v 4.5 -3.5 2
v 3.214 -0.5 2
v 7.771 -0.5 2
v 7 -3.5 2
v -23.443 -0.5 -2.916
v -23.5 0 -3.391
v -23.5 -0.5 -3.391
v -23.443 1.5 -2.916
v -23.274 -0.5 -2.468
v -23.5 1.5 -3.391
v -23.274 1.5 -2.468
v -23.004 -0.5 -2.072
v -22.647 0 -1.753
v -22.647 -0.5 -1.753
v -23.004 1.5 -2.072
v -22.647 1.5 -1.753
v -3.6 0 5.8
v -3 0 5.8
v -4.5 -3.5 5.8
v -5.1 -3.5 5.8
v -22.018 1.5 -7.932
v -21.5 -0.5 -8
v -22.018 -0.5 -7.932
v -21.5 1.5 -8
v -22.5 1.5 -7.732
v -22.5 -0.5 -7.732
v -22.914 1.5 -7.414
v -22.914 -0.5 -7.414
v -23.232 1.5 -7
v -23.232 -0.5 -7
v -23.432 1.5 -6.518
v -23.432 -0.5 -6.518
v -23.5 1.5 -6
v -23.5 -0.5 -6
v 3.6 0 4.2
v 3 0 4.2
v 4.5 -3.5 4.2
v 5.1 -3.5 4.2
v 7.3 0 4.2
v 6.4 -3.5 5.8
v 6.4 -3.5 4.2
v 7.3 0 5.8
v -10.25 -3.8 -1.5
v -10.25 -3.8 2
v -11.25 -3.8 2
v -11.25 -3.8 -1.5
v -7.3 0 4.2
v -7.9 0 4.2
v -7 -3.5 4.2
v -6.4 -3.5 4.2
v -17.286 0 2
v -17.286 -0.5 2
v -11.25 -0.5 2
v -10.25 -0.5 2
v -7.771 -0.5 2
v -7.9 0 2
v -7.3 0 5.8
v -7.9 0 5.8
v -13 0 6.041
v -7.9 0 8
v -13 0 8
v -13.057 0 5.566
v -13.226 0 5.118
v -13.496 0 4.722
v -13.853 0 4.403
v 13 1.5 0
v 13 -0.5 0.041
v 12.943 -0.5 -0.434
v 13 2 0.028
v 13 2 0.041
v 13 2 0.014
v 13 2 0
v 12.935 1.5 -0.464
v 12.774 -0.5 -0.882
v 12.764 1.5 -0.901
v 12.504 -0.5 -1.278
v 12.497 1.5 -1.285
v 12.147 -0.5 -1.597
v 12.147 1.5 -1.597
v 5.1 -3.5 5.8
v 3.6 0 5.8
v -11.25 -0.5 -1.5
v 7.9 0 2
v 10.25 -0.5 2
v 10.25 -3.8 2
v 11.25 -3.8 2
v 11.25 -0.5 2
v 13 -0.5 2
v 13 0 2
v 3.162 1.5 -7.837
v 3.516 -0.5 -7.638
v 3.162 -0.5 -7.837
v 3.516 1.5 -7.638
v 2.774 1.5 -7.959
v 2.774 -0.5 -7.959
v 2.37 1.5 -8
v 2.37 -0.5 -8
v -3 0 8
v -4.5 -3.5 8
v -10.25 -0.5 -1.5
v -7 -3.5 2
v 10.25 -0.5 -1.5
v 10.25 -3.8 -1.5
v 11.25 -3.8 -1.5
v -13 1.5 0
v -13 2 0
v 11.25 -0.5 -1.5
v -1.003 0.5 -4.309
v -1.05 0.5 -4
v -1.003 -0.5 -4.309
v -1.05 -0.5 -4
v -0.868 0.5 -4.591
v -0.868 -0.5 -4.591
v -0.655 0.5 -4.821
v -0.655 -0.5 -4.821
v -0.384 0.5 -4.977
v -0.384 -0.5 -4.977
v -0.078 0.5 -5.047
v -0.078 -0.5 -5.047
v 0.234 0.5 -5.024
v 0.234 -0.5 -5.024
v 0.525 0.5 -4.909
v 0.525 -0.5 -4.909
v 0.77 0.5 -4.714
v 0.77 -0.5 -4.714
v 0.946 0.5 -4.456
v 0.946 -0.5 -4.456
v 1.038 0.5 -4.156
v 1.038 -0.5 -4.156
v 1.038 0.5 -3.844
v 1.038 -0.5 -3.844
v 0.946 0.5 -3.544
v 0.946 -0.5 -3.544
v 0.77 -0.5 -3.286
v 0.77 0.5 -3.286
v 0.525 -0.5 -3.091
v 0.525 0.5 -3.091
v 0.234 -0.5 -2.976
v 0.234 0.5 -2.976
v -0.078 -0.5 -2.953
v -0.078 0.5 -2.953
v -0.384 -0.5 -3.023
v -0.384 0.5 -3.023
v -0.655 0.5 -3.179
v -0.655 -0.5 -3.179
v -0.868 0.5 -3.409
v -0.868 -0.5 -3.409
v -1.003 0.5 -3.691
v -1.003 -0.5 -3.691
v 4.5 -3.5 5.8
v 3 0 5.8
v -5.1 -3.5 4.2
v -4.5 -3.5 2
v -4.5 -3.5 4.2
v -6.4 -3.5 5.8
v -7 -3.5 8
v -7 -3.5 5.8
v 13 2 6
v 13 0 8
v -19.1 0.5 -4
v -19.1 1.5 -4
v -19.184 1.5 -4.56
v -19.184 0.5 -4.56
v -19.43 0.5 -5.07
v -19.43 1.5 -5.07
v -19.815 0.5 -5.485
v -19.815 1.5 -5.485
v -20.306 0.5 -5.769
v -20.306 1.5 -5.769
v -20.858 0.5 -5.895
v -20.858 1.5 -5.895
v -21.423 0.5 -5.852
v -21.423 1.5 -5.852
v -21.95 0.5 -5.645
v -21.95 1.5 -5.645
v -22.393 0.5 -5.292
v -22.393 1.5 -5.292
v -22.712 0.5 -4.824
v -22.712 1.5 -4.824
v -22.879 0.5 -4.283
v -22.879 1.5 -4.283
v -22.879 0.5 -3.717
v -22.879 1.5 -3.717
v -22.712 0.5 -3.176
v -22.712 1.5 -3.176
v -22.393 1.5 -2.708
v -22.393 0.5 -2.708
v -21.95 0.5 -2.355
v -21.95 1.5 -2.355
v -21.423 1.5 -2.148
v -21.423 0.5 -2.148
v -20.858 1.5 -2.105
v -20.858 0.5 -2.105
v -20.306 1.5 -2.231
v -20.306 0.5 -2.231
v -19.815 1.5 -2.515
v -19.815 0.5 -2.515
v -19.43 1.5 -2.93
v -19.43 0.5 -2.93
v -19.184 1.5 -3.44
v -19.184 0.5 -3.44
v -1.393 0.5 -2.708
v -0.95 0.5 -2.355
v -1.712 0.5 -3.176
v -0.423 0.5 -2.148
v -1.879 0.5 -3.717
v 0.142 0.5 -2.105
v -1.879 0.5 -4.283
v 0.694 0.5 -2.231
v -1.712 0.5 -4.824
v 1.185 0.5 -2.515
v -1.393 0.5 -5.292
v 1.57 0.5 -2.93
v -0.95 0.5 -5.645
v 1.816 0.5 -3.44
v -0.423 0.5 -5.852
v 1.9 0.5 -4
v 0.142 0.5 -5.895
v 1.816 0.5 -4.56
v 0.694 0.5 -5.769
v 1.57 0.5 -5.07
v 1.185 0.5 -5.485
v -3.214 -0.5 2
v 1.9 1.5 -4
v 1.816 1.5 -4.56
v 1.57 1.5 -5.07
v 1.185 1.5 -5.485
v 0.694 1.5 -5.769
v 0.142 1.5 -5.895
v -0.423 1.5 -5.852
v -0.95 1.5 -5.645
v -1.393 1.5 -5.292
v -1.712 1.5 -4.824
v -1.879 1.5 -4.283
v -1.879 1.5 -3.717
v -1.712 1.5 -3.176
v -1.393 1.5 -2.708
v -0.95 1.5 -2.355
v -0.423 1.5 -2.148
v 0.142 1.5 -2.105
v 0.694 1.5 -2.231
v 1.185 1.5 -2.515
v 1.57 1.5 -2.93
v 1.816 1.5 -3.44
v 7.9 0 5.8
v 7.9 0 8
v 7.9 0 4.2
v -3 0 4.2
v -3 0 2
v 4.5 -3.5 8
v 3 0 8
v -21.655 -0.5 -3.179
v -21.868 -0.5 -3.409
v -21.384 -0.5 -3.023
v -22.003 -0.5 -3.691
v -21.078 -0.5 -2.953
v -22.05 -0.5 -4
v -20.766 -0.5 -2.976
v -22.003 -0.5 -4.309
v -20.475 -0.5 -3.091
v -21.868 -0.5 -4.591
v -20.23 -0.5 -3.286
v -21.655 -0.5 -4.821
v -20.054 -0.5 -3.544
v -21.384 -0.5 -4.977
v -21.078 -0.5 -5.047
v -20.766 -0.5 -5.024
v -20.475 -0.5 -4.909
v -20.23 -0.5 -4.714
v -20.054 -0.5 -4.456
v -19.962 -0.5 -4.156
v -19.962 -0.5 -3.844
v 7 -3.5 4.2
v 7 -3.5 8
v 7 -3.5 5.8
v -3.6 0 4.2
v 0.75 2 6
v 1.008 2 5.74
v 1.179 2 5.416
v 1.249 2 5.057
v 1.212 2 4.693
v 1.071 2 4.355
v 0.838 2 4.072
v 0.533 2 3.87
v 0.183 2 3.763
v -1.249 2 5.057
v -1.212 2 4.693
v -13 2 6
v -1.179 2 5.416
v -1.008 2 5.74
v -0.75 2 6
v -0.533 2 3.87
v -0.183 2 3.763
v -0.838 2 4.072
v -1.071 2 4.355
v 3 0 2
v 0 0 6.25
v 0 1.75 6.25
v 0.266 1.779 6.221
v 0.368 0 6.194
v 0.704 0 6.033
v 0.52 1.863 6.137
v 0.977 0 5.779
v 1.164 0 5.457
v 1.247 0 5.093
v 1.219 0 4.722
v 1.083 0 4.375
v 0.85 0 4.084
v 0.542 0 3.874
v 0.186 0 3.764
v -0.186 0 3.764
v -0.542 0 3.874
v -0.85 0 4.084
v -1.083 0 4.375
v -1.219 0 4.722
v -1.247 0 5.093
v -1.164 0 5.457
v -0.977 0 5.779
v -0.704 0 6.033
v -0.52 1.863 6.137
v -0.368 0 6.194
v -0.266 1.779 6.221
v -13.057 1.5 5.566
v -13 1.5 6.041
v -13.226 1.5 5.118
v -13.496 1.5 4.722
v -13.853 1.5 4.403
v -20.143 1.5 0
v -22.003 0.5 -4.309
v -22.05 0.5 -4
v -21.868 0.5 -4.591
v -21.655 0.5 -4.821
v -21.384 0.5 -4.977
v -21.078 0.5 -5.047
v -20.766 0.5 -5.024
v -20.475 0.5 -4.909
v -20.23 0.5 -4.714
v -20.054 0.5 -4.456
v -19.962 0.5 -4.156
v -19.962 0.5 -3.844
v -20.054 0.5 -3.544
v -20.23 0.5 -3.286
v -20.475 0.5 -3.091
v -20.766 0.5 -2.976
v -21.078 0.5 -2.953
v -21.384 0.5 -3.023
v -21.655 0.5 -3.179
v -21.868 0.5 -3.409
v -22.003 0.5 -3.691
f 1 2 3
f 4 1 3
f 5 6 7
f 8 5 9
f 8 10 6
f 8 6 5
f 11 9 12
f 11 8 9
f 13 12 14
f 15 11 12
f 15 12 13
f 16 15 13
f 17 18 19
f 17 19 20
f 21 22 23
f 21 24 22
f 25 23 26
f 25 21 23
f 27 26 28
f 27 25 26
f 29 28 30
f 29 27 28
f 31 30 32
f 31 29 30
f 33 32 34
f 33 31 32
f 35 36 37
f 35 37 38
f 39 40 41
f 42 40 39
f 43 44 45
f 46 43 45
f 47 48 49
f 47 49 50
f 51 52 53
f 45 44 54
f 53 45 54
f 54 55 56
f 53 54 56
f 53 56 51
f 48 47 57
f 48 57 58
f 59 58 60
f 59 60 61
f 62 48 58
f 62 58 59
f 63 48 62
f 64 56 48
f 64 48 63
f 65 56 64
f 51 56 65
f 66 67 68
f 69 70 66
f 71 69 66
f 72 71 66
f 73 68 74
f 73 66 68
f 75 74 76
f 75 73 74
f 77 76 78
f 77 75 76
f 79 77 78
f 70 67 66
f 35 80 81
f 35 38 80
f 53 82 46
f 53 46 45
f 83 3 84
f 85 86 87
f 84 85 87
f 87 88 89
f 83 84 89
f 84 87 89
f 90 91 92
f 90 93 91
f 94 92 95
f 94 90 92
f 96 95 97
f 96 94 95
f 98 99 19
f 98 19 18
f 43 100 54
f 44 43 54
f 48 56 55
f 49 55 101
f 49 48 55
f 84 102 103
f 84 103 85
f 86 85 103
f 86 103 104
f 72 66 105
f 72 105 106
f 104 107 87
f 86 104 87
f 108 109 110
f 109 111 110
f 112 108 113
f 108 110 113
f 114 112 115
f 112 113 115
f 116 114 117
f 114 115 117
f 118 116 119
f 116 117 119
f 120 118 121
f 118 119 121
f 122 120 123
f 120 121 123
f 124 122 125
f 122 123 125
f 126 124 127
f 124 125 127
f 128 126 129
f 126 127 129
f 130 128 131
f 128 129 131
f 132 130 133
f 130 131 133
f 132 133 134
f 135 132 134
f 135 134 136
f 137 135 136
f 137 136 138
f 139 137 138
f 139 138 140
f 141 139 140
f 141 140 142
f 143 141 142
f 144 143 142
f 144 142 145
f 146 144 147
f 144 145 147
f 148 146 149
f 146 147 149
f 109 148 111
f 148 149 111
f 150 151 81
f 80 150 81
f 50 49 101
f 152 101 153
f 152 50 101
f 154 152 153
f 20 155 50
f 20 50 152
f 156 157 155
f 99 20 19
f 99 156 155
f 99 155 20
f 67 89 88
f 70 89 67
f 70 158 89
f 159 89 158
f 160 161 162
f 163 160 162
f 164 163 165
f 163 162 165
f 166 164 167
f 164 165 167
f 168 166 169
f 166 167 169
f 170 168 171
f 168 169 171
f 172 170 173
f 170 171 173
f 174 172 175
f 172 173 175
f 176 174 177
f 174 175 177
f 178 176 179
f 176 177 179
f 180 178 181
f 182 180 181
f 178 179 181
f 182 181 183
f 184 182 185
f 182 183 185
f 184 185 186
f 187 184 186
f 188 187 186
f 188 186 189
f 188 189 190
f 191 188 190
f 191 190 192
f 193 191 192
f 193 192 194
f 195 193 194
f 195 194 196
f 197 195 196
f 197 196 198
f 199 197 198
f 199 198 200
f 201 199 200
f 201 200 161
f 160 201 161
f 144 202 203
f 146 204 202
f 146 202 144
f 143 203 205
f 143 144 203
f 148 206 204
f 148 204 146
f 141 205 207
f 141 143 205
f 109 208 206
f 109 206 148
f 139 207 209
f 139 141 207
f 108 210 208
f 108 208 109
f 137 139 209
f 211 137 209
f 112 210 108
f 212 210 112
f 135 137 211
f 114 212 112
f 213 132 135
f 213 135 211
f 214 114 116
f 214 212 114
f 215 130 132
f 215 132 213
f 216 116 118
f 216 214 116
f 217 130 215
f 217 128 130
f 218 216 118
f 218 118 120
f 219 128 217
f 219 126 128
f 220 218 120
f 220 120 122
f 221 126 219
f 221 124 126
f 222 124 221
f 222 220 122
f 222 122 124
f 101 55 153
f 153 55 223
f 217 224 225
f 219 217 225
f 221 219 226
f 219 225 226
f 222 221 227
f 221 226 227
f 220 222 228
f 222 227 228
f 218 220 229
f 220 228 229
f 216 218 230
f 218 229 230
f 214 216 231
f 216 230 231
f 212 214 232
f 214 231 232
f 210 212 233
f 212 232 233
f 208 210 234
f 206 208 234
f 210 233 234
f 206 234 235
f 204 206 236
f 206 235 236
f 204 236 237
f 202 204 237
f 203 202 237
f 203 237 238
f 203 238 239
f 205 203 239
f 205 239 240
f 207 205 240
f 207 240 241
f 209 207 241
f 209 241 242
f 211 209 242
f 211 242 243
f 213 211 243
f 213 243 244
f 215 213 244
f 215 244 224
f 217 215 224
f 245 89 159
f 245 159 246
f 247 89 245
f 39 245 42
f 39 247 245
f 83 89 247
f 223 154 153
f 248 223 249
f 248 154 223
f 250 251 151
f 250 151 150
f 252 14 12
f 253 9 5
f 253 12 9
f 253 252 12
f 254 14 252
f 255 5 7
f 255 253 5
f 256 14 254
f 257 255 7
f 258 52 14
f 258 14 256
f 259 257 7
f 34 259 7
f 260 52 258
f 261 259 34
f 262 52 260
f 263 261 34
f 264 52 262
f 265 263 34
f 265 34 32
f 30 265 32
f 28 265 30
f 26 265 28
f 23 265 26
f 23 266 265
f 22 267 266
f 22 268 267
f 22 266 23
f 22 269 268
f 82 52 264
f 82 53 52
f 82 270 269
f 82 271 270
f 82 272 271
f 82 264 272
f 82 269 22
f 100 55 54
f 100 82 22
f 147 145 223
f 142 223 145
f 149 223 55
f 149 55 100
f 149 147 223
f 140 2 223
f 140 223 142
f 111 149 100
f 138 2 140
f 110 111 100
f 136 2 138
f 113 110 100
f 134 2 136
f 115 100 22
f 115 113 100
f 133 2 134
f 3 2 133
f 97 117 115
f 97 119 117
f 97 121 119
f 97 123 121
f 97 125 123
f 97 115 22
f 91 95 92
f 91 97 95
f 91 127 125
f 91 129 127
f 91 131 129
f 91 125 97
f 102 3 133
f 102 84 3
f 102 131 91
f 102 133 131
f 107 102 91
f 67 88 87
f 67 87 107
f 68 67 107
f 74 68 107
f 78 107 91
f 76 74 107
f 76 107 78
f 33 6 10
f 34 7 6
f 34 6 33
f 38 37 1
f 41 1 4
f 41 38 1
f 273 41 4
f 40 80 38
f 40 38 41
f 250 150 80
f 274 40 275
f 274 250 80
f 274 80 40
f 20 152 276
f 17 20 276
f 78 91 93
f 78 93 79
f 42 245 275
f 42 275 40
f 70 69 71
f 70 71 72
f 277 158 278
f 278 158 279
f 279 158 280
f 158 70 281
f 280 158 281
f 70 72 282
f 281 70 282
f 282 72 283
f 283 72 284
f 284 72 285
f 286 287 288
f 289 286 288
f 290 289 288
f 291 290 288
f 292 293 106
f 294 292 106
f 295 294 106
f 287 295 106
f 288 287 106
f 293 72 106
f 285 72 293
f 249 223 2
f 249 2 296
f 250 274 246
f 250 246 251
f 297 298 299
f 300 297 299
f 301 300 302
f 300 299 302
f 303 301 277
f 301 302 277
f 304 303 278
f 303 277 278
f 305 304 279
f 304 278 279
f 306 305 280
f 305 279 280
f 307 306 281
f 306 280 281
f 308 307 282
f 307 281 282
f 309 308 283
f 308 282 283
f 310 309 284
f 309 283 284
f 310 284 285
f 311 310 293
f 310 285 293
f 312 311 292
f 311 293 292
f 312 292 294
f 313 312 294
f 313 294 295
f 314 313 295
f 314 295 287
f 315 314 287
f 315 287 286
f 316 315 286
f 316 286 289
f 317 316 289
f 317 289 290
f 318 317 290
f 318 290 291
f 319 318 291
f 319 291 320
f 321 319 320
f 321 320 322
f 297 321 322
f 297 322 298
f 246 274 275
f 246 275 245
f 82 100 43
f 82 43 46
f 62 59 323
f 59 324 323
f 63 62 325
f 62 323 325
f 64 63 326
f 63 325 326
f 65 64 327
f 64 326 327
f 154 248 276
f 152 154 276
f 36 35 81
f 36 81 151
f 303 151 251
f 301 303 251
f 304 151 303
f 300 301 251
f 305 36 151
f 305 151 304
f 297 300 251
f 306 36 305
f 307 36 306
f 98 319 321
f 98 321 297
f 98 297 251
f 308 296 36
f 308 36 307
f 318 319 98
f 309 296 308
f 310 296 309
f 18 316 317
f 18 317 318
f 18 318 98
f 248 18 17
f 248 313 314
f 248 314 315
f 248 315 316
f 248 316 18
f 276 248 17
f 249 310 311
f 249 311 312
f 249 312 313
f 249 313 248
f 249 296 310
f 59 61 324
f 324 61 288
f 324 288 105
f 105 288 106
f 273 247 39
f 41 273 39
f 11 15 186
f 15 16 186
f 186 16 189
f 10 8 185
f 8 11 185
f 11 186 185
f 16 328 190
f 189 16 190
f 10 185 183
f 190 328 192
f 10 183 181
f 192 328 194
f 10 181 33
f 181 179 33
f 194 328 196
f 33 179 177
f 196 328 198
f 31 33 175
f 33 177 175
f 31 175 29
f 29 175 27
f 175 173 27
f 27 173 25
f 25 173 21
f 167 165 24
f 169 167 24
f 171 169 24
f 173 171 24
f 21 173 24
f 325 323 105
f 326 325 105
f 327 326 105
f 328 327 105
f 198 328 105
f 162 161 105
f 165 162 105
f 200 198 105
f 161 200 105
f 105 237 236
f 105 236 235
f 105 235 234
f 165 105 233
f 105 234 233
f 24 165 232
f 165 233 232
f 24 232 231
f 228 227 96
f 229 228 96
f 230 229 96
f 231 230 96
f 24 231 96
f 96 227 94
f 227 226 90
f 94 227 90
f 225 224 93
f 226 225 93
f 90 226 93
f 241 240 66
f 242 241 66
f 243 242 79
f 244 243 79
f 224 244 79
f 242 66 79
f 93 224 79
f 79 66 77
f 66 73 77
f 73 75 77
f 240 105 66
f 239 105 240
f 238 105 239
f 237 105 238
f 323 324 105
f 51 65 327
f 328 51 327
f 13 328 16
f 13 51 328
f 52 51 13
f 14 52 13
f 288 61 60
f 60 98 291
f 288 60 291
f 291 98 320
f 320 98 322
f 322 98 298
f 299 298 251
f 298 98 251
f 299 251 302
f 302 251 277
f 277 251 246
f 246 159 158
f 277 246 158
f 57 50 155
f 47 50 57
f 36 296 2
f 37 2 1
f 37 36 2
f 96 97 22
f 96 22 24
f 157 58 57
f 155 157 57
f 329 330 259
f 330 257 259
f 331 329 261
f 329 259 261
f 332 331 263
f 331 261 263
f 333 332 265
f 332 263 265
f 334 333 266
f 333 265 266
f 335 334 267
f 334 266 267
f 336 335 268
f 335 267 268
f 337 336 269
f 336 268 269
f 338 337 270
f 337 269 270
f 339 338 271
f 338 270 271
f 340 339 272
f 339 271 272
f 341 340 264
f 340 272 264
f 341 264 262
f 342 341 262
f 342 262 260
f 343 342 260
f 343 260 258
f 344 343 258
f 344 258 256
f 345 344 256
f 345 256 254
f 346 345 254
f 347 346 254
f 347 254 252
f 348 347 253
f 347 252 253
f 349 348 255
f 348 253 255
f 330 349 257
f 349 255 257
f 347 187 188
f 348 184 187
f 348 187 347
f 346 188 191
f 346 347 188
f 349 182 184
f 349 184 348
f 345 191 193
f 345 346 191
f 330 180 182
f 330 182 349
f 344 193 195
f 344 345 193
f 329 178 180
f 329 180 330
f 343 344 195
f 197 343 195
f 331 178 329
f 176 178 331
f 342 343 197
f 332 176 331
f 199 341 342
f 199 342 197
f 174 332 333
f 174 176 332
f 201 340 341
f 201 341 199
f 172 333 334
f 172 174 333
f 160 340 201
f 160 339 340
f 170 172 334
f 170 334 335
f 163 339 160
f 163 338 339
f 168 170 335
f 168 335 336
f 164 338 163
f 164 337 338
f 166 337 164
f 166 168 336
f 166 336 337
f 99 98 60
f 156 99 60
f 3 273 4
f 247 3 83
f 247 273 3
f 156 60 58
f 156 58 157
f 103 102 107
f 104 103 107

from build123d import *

# Parameters (mm, degrees)
EXTRUDE_1_DEPTH              = 2
EXTRUDE_3_DEPTH              = 6
CUT_EXTRUDE_1_REACH          = 27.426
SKETCH_5_R                   = 1.25
EXTRUDE_4_REACH              = 39.53
SKETCH_6_W                   = 10
SKETCH_6_H                   = 0.5
CUT_EXTRUDE_2_REACH          = 39.53
SKETCH_7_W                   = 8
SKETCH_7_H                   = 0.5
SKETCH_10_W                  = 1
SKETCH_10_H                  = 3.5
EXTRUDE_5_DEPTH              = 3.3
CHAMFER_1_SIZE               = 2
CUT_EXTRUDE_3_REACH          = 27.114
CUT_EXTRUDE_4_DEPTH          = 0.5
HOLE_WIZARD_M2_2_D           = 2.1
HOLE_WIZARD_M2_2_CBORE_D     = 3.8
HOLE_WIZARD_M2_2_CBORE_DEPTH = 1
FILLET_3_R                   = 2
CUT_EXTRUDE_5_DEPTH          = 0.8


with BuildPart() as part:
    # ｽｹｯﾁ1 → ﾎﾞｽ - 押し出し1 (new body)
    with BuildSketch(Plane(origin=(0, 0, 0), x_dir=(1, 0, 0), z_dir=(0, 1, 0))):
        Polygon((-13, 8), (3, 8), (13, 1), (13, -8), (-13, -8), (-13, -5), (-23.5, 2.35), (-23.5, 8), align=None)
    extrude(amount=EXTRUDE_1_DEPTH)

    # ｽｹｯﾁ4 → ﾎﾞｽ - 押し出し3 (add)
    with BuildSketch(Plane.XY.offset(8)):
        Polygon((-7, -3.5), (-4.5, -3.5), (-3, 0), (-7.9, 0), align=None)
        Polygon((3, 0), (4.5, -3.5), (7, -3.5), (7.9, 0), align=None)
    extrude(amount=-EXTRUDE_3_DEPTH)

    # ｽｹｯﾁ5 → ｶｯﾄ - 押し出し1 (cut, up to next)
    with BuildSketch(Plane(origin=(0, 2, 0), x_dir=(1, 0, 0), z_dir=(0, 1, 0)), mode=Mode.PRIVATE) as cut_extrude_1_sk1:
        with Locations(Location((0, -5, 0), (0, 0, 270))):
            Circle(SKETCH_5_R)
    cut_extrude_1_tool1 = extrude(cut_extrude_1_sk1.sketch, amount=-CUT_EXTRUDE_1_REACH, mode=Mode.PRIVATE) & part.part
    add(cut_extrude_1_tool1.solids().sort_by_distance((0, 2, 5))[0], mode=Mode.SUBTRACT)

    # ﾎﾞｽ - 押し出し4: up to this face of the body (flat: up to its plane)
    extrude_4_end = Plane(part.part.faces().sort_by_distance((-23.5, 1, -5.175))[0])
    # ｽｹｯﾁ6 → ﾎﾞｽ - 押し出し4 (add, up to the picked face)
    with BuildSketch(Plane(origin=(13, 0, 0), x_dir=(0, 0, -1), z_dir=(1, 0, 0)), mode=Mode.PRIVATE) as extrude_4_sk1:
        with Locations((3, -0.25)):
            Rectangle(SKETCH_6_W, SKETCH_6_H)
    extrude_4_tool1 = split(extrude(extrude_4_sk1.sketch, amount=-EXTRUDE_4_REACH, mode=Mode.PRIVATE), bisect_by=extrude_4_end, keep=Keep.BOTH, mode=Mode.PRIVATE)
    add(extrude_4_tool1.solids().sort_by(Axis((13, -0.25, -3), (-1, 0, 0)))[0])

    # ｽｹｯﾁ7 → ｶｯﾄ - 押し出し2 (cut, up to next)
    with BuildSketch(Plane(origin=(13, 0, 0), x_dir=(0, 0, -1), z_dir=(1, 0, 0)), mode=Mode.PRIVATE) as cut_extrude_2_sk1:
        with Locations((4, 1.75)):
            Rectangle(SKETCH_7_W, SKETCH_7_H)
    cut_extrude_2_tool1 = extrude(cut_extrude_2_sk1.sketch, amount=-CUT_EXTRUDE_2_REACH, mode=Mode.PRIVATE) & part.part
    add(cut_extrude_2_tool1.solids().sort_by_distance((13, 1.75, -4))[0], mode=Mode.SUBTRACT)

    # ｽｹｯﾁ10 → ﾎﾞｽ - 押し出し5 (add)
    with BuildSketch(Plane.XZ.offset(0.5)):
        with Locations((10.75, 0.25)):
            Rectangle(SKETCH_10_W, SKETCH_10_H)
    extrude_5 = extrude(amount=EXTRUDE_5_DEPTH)

    # ﾐﾗｰ1: ﾎﾞｽ - 押し出し5 across plane
    add(extrude_5.mirror(Plane(origin=(0, 0, 0), x_dir=(0, 0, 1), z_dir=(1, 0, 0))))

    # 面取り1
    # the kernel refuses this chamfer: 2 mm, written as the material it takes off along each edge
    with BuildSketch(Plane(origin=(18.143365976, 2, 8), x_dir=(0, -0.9996219169112968, 0.027495876610586494), z_dir=(-1, 0, 0))) as chamfer_1_piece_1:
        Polygon((CHAMFER_1_SIZE * 0.999621916911, -CHAMFER_1_SIZE * 0.0274958766106), (-CHAMFER_1_SIZE * 0.0274958766106, -CHAMFER_1_SIZE * 0.999621916911), (0, 0), align=None)
    extrude(amount=36.286731952, mode=Mode.SUBTRACT)

    # ｽｹｯﾁ12 → ｶｯﾄ - 押し出し3 (cut, up to next)
    with BuildSketch(Plane(origin=(0, 0, 0), x_dir=(1, 0, 0), z_dir=(0, 1, 0)), mode=Mode.PRIVATE) as cut_extrude_3_sk1:
        Polygon((3, 8), (13, 8), (13, 1), align=None)
    cut_extrude_3_tool1 = extrude(cut_extrude_3_sk1.sketch, amount=-CUT_EXTRUDE_3_REACH, mode=Mode.PRIVATE) & part.part
    # ｽｹｯﾁ12 → ｶｯﾄ - 押し出し3 (cut, up to next)
    with BuildSketch(Plane(origin=(0, 0, 0), x_dir=(1, 0, 0), z_dir=(0, 1, 0)), mode=Mode.PRIVATE) as cut_extrude_3_sk2:
        Polygon((-23.5, -2), (-17.285714286, -2), (-23.5, 2.35), align=None)
    cut_extrude_3_tool2 = extrude(cut_extrude_3_sk2.sketch, amount=-CUT_EXTRUDE_3_REACH, mode=Mode.PRIVATE) & part.part
    add(cut_extrude_3_tool1.solids().sort_by_distance((9.666667, 0, -5.666667))[0], mode=Mode.SUBTRACT)
    add(cut_extrude_3_tool2.solids().sort_by_distance((-21.428571, 0, 0.55))[0], mode=Mode.SUBTRACT)

    # ｽｹｯﾁ13 → ｶｯﾄ - 押し出し4 (cut)
    with BuildSketch(Plane(origin=(0, 2, 0), x_dir=(1, 0, 0), z_dir=(0, 1, 0))):
        Polygon((-13, -5), (-13, 0), (-20.142857143, 0), align=None)
    extrude(amount=-CUT_EXTRUDE_4_DEPTH, mode=Mode.SUBTRACT)

    # M2 丸平ねじ用座ぐり穴2 (through all)
    with Locations(Plane(origin=(0, 1.5, 0), x_dir=(1, 0, 0), z_dir=(0, 1, 0))):
        with Locations((-21, 4), (0, 4)):
            CounterBoreHole(HOLE_WIZARD_M2_2_D / 2, HOLE_WIZARD_M2_2_CBORE_D / 2, HOLE_WIZARD_M2_2_CBORE_DEPTH)

    # ﾌｨﾚｯﾄ3
    fillet_3_edges = [part.edges().sort_by_distance(p)[0] for p in [
        (-13, 0.75, 5),
        (13, 0.5, -1),
        (3, 0.5, -8),
        (-23.5, 0.5, -8),
        (-23.5, 0.5, -2.35),
    ]]
    fillet(fillet_3_edges, radius=FILLET_3_R)

    # ｽｹｯﾁ16 → ｶｯﾄ - 押し出し5 (cut, symmetric)
    with BuildSketch(Plane.XY.offset(5)):
        Polygon((-7.9, 0), (-7, -3.5), (-6.4, -3.5), (-7.3, 0), align=None)
        Polygon((-3, 0), (-4.5, -3.5), (-5.1, -3.5), (-3.6, 0), align=None)
        Polygon((3, 0), (4.5, -3.5), (5.1, -3.5), (3.6, 0), align=None)
        Polygon((7.9, 0), (7, -3.5), (6.4, -3.5), (7.3, 0), align=None)
    extrude(amount=CUT_EXTRUDE_5_DEPTH, both=True, mode=Mode.SUBTRACT)


solid = part.part
